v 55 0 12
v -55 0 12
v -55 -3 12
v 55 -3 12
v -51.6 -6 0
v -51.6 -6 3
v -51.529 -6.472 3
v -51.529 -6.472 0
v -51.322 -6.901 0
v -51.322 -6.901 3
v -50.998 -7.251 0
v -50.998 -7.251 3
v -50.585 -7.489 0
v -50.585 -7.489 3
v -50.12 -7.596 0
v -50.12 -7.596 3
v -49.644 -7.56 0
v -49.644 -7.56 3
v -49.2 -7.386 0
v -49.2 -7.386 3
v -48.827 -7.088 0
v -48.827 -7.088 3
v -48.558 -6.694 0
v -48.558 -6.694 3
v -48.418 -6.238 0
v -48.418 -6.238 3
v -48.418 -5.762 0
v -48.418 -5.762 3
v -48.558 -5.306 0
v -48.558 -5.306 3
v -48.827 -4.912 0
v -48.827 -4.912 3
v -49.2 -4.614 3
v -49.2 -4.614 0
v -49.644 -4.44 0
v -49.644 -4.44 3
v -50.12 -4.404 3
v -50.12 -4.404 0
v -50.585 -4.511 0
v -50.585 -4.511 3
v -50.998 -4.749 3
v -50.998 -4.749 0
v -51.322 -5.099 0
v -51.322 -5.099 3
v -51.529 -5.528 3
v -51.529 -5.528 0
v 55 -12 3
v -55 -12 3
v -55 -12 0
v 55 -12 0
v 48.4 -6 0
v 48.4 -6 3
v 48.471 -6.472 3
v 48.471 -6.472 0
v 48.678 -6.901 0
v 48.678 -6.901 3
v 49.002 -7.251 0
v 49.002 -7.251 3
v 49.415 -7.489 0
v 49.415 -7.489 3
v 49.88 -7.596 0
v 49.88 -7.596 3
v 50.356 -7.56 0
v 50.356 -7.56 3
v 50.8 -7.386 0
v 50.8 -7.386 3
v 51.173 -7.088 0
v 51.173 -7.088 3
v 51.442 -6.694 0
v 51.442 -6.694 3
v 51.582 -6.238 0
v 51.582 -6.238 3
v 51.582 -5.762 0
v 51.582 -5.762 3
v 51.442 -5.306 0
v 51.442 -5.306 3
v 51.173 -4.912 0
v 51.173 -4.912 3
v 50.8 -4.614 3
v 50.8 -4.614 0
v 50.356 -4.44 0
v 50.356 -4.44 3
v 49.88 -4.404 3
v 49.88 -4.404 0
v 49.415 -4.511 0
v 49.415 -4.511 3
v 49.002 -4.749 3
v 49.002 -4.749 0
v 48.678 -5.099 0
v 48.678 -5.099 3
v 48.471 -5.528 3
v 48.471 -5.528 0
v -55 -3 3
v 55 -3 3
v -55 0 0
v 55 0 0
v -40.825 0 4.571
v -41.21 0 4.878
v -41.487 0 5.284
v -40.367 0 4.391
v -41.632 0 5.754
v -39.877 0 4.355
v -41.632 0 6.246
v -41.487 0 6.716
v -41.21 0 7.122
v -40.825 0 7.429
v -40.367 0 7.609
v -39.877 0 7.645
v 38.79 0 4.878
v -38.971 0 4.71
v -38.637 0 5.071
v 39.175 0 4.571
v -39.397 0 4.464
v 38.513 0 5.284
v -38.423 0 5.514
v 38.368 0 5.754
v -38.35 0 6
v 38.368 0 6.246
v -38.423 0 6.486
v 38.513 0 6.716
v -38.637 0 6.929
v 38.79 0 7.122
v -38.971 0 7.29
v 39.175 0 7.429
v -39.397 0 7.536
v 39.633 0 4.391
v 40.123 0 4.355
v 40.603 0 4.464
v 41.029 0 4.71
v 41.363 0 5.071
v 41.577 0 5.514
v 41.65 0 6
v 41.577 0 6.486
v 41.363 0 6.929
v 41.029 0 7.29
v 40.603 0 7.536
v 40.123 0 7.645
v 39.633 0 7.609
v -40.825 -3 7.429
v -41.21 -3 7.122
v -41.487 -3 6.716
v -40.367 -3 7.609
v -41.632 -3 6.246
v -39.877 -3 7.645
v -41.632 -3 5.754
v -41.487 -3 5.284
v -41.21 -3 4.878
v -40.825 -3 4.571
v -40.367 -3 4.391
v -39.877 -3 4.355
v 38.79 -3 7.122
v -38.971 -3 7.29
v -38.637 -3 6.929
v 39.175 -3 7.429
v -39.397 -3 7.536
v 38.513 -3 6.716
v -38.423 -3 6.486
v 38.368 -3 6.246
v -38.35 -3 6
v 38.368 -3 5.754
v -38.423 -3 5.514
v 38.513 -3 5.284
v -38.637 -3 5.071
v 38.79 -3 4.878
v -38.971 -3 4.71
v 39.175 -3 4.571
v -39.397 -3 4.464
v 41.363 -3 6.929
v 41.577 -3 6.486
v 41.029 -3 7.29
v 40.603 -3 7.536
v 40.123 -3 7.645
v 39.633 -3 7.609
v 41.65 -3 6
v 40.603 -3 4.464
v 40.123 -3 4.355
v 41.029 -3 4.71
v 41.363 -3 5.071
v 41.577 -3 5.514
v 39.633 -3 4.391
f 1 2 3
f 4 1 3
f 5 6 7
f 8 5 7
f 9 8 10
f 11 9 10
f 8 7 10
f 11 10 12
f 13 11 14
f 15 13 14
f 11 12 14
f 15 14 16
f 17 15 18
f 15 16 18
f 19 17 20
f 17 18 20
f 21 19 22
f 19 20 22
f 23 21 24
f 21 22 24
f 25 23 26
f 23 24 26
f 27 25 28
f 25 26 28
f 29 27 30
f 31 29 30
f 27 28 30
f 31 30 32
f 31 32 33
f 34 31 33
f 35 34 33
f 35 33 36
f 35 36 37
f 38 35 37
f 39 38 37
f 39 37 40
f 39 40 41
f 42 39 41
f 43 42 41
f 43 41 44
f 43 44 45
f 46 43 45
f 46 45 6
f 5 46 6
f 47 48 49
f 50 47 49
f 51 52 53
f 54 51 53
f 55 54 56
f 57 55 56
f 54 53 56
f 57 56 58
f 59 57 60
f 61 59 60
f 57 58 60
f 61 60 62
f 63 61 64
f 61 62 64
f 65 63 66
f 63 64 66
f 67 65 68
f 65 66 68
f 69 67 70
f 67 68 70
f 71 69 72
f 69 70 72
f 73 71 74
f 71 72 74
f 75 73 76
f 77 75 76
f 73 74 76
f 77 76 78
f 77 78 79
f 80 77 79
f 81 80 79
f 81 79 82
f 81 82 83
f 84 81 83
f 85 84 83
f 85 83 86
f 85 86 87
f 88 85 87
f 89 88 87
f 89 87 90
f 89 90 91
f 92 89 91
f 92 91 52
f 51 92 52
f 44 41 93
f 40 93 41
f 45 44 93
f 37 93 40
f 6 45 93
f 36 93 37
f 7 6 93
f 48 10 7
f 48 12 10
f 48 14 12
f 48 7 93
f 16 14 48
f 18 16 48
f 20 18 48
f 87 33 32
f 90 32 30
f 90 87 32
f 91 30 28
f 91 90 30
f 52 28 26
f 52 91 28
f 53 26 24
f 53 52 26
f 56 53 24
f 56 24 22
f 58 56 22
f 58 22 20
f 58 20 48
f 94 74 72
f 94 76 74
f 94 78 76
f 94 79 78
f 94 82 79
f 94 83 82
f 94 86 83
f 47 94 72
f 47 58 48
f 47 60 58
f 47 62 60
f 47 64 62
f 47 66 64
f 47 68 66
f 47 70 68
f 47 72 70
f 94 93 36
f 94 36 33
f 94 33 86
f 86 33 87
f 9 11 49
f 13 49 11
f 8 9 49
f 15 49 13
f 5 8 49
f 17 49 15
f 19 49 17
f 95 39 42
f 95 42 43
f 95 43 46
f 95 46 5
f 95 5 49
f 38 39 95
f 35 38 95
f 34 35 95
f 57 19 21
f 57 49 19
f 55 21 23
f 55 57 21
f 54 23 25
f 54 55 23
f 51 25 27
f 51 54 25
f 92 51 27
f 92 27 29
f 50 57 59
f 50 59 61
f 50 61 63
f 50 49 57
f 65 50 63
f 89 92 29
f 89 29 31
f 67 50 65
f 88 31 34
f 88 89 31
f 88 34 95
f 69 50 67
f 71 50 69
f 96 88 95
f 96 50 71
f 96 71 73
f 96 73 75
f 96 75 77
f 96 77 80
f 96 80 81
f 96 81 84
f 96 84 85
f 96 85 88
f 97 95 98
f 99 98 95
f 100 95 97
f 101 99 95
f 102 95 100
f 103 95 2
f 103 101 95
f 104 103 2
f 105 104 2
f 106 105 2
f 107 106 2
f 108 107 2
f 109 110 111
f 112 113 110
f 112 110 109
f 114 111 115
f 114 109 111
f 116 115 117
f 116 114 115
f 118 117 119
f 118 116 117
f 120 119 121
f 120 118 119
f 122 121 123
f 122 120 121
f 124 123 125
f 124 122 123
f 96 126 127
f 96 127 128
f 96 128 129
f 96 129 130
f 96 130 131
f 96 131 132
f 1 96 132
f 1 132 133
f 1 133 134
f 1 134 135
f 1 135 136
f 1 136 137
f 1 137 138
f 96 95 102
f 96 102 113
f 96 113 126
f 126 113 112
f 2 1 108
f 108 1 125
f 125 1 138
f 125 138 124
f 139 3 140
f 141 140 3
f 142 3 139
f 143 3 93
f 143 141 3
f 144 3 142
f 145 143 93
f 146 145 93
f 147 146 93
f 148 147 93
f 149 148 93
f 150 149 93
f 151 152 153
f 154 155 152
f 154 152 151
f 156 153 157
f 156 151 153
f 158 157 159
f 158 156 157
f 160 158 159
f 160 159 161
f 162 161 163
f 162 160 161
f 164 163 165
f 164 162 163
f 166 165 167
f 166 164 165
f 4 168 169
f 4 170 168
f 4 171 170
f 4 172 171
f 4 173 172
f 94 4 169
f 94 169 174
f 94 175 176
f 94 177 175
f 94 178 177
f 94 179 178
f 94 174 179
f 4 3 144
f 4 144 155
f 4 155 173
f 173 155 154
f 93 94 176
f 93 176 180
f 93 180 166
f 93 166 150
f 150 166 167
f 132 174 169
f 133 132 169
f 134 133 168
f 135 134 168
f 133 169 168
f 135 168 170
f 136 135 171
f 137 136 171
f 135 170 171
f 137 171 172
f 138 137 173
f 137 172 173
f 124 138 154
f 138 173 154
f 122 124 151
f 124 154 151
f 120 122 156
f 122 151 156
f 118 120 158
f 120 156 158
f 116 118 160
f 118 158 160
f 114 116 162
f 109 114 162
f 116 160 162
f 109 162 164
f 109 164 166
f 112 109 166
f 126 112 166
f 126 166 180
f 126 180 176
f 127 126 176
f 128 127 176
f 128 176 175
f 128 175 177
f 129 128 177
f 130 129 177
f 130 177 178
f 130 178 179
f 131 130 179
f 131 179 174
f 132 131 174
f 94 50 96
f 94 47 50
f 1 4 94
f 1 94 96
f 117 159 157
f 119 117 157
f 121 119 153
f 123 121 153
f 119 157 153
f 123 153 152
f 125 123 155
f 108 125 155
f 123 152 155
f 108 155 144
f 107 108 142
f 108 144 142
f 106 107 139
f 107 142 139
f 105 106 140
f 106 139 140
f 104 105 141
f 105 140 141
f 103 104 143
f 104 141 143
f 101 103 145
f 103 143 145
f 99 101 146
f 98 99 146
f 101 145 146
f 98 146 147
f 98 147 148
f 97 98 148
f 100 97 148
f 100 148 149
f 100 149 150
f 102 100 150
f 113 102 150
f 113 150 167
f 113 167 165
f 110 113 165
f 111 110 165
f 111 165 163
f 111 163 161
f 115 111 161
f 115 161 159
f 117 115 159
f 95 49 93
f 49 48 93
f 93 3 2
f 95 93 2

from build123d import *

# Parameters (mm, degrees)
F1_DEPTH = 55
F3_D     = 3.2
F5_D     = 3.3


with BuildPart() as f1:
    # F0 (on Right) → F1 (new body, symmetric)
    with BuildSketch(Plane.YZ):
        Polygon((-12, 0), (0, 0), (0, 12), (-3, 12), (-3, 3), (-12, 3), align=None)
    extrude(amount=F1_DEPTH, both=True)

    # F3 (through all)
    with Locations(Plane(origin=(0, 0, 0), x_dir=(1, 0, 0), z_dir=(0, 0, -1))):
        with Locations((-50, 6), (50, 6)):
            Hole(F3_D / 2)

    # F5 (through all)
    with Locations(Plane(origin=(0, 0, 0), x_dir=(-1, 0, 0), z_dir=(0, 1, 0))):
        with Locations((40, 6), (-40, 6)):
            Hole(F5_D / 2)


solid = f1.part
